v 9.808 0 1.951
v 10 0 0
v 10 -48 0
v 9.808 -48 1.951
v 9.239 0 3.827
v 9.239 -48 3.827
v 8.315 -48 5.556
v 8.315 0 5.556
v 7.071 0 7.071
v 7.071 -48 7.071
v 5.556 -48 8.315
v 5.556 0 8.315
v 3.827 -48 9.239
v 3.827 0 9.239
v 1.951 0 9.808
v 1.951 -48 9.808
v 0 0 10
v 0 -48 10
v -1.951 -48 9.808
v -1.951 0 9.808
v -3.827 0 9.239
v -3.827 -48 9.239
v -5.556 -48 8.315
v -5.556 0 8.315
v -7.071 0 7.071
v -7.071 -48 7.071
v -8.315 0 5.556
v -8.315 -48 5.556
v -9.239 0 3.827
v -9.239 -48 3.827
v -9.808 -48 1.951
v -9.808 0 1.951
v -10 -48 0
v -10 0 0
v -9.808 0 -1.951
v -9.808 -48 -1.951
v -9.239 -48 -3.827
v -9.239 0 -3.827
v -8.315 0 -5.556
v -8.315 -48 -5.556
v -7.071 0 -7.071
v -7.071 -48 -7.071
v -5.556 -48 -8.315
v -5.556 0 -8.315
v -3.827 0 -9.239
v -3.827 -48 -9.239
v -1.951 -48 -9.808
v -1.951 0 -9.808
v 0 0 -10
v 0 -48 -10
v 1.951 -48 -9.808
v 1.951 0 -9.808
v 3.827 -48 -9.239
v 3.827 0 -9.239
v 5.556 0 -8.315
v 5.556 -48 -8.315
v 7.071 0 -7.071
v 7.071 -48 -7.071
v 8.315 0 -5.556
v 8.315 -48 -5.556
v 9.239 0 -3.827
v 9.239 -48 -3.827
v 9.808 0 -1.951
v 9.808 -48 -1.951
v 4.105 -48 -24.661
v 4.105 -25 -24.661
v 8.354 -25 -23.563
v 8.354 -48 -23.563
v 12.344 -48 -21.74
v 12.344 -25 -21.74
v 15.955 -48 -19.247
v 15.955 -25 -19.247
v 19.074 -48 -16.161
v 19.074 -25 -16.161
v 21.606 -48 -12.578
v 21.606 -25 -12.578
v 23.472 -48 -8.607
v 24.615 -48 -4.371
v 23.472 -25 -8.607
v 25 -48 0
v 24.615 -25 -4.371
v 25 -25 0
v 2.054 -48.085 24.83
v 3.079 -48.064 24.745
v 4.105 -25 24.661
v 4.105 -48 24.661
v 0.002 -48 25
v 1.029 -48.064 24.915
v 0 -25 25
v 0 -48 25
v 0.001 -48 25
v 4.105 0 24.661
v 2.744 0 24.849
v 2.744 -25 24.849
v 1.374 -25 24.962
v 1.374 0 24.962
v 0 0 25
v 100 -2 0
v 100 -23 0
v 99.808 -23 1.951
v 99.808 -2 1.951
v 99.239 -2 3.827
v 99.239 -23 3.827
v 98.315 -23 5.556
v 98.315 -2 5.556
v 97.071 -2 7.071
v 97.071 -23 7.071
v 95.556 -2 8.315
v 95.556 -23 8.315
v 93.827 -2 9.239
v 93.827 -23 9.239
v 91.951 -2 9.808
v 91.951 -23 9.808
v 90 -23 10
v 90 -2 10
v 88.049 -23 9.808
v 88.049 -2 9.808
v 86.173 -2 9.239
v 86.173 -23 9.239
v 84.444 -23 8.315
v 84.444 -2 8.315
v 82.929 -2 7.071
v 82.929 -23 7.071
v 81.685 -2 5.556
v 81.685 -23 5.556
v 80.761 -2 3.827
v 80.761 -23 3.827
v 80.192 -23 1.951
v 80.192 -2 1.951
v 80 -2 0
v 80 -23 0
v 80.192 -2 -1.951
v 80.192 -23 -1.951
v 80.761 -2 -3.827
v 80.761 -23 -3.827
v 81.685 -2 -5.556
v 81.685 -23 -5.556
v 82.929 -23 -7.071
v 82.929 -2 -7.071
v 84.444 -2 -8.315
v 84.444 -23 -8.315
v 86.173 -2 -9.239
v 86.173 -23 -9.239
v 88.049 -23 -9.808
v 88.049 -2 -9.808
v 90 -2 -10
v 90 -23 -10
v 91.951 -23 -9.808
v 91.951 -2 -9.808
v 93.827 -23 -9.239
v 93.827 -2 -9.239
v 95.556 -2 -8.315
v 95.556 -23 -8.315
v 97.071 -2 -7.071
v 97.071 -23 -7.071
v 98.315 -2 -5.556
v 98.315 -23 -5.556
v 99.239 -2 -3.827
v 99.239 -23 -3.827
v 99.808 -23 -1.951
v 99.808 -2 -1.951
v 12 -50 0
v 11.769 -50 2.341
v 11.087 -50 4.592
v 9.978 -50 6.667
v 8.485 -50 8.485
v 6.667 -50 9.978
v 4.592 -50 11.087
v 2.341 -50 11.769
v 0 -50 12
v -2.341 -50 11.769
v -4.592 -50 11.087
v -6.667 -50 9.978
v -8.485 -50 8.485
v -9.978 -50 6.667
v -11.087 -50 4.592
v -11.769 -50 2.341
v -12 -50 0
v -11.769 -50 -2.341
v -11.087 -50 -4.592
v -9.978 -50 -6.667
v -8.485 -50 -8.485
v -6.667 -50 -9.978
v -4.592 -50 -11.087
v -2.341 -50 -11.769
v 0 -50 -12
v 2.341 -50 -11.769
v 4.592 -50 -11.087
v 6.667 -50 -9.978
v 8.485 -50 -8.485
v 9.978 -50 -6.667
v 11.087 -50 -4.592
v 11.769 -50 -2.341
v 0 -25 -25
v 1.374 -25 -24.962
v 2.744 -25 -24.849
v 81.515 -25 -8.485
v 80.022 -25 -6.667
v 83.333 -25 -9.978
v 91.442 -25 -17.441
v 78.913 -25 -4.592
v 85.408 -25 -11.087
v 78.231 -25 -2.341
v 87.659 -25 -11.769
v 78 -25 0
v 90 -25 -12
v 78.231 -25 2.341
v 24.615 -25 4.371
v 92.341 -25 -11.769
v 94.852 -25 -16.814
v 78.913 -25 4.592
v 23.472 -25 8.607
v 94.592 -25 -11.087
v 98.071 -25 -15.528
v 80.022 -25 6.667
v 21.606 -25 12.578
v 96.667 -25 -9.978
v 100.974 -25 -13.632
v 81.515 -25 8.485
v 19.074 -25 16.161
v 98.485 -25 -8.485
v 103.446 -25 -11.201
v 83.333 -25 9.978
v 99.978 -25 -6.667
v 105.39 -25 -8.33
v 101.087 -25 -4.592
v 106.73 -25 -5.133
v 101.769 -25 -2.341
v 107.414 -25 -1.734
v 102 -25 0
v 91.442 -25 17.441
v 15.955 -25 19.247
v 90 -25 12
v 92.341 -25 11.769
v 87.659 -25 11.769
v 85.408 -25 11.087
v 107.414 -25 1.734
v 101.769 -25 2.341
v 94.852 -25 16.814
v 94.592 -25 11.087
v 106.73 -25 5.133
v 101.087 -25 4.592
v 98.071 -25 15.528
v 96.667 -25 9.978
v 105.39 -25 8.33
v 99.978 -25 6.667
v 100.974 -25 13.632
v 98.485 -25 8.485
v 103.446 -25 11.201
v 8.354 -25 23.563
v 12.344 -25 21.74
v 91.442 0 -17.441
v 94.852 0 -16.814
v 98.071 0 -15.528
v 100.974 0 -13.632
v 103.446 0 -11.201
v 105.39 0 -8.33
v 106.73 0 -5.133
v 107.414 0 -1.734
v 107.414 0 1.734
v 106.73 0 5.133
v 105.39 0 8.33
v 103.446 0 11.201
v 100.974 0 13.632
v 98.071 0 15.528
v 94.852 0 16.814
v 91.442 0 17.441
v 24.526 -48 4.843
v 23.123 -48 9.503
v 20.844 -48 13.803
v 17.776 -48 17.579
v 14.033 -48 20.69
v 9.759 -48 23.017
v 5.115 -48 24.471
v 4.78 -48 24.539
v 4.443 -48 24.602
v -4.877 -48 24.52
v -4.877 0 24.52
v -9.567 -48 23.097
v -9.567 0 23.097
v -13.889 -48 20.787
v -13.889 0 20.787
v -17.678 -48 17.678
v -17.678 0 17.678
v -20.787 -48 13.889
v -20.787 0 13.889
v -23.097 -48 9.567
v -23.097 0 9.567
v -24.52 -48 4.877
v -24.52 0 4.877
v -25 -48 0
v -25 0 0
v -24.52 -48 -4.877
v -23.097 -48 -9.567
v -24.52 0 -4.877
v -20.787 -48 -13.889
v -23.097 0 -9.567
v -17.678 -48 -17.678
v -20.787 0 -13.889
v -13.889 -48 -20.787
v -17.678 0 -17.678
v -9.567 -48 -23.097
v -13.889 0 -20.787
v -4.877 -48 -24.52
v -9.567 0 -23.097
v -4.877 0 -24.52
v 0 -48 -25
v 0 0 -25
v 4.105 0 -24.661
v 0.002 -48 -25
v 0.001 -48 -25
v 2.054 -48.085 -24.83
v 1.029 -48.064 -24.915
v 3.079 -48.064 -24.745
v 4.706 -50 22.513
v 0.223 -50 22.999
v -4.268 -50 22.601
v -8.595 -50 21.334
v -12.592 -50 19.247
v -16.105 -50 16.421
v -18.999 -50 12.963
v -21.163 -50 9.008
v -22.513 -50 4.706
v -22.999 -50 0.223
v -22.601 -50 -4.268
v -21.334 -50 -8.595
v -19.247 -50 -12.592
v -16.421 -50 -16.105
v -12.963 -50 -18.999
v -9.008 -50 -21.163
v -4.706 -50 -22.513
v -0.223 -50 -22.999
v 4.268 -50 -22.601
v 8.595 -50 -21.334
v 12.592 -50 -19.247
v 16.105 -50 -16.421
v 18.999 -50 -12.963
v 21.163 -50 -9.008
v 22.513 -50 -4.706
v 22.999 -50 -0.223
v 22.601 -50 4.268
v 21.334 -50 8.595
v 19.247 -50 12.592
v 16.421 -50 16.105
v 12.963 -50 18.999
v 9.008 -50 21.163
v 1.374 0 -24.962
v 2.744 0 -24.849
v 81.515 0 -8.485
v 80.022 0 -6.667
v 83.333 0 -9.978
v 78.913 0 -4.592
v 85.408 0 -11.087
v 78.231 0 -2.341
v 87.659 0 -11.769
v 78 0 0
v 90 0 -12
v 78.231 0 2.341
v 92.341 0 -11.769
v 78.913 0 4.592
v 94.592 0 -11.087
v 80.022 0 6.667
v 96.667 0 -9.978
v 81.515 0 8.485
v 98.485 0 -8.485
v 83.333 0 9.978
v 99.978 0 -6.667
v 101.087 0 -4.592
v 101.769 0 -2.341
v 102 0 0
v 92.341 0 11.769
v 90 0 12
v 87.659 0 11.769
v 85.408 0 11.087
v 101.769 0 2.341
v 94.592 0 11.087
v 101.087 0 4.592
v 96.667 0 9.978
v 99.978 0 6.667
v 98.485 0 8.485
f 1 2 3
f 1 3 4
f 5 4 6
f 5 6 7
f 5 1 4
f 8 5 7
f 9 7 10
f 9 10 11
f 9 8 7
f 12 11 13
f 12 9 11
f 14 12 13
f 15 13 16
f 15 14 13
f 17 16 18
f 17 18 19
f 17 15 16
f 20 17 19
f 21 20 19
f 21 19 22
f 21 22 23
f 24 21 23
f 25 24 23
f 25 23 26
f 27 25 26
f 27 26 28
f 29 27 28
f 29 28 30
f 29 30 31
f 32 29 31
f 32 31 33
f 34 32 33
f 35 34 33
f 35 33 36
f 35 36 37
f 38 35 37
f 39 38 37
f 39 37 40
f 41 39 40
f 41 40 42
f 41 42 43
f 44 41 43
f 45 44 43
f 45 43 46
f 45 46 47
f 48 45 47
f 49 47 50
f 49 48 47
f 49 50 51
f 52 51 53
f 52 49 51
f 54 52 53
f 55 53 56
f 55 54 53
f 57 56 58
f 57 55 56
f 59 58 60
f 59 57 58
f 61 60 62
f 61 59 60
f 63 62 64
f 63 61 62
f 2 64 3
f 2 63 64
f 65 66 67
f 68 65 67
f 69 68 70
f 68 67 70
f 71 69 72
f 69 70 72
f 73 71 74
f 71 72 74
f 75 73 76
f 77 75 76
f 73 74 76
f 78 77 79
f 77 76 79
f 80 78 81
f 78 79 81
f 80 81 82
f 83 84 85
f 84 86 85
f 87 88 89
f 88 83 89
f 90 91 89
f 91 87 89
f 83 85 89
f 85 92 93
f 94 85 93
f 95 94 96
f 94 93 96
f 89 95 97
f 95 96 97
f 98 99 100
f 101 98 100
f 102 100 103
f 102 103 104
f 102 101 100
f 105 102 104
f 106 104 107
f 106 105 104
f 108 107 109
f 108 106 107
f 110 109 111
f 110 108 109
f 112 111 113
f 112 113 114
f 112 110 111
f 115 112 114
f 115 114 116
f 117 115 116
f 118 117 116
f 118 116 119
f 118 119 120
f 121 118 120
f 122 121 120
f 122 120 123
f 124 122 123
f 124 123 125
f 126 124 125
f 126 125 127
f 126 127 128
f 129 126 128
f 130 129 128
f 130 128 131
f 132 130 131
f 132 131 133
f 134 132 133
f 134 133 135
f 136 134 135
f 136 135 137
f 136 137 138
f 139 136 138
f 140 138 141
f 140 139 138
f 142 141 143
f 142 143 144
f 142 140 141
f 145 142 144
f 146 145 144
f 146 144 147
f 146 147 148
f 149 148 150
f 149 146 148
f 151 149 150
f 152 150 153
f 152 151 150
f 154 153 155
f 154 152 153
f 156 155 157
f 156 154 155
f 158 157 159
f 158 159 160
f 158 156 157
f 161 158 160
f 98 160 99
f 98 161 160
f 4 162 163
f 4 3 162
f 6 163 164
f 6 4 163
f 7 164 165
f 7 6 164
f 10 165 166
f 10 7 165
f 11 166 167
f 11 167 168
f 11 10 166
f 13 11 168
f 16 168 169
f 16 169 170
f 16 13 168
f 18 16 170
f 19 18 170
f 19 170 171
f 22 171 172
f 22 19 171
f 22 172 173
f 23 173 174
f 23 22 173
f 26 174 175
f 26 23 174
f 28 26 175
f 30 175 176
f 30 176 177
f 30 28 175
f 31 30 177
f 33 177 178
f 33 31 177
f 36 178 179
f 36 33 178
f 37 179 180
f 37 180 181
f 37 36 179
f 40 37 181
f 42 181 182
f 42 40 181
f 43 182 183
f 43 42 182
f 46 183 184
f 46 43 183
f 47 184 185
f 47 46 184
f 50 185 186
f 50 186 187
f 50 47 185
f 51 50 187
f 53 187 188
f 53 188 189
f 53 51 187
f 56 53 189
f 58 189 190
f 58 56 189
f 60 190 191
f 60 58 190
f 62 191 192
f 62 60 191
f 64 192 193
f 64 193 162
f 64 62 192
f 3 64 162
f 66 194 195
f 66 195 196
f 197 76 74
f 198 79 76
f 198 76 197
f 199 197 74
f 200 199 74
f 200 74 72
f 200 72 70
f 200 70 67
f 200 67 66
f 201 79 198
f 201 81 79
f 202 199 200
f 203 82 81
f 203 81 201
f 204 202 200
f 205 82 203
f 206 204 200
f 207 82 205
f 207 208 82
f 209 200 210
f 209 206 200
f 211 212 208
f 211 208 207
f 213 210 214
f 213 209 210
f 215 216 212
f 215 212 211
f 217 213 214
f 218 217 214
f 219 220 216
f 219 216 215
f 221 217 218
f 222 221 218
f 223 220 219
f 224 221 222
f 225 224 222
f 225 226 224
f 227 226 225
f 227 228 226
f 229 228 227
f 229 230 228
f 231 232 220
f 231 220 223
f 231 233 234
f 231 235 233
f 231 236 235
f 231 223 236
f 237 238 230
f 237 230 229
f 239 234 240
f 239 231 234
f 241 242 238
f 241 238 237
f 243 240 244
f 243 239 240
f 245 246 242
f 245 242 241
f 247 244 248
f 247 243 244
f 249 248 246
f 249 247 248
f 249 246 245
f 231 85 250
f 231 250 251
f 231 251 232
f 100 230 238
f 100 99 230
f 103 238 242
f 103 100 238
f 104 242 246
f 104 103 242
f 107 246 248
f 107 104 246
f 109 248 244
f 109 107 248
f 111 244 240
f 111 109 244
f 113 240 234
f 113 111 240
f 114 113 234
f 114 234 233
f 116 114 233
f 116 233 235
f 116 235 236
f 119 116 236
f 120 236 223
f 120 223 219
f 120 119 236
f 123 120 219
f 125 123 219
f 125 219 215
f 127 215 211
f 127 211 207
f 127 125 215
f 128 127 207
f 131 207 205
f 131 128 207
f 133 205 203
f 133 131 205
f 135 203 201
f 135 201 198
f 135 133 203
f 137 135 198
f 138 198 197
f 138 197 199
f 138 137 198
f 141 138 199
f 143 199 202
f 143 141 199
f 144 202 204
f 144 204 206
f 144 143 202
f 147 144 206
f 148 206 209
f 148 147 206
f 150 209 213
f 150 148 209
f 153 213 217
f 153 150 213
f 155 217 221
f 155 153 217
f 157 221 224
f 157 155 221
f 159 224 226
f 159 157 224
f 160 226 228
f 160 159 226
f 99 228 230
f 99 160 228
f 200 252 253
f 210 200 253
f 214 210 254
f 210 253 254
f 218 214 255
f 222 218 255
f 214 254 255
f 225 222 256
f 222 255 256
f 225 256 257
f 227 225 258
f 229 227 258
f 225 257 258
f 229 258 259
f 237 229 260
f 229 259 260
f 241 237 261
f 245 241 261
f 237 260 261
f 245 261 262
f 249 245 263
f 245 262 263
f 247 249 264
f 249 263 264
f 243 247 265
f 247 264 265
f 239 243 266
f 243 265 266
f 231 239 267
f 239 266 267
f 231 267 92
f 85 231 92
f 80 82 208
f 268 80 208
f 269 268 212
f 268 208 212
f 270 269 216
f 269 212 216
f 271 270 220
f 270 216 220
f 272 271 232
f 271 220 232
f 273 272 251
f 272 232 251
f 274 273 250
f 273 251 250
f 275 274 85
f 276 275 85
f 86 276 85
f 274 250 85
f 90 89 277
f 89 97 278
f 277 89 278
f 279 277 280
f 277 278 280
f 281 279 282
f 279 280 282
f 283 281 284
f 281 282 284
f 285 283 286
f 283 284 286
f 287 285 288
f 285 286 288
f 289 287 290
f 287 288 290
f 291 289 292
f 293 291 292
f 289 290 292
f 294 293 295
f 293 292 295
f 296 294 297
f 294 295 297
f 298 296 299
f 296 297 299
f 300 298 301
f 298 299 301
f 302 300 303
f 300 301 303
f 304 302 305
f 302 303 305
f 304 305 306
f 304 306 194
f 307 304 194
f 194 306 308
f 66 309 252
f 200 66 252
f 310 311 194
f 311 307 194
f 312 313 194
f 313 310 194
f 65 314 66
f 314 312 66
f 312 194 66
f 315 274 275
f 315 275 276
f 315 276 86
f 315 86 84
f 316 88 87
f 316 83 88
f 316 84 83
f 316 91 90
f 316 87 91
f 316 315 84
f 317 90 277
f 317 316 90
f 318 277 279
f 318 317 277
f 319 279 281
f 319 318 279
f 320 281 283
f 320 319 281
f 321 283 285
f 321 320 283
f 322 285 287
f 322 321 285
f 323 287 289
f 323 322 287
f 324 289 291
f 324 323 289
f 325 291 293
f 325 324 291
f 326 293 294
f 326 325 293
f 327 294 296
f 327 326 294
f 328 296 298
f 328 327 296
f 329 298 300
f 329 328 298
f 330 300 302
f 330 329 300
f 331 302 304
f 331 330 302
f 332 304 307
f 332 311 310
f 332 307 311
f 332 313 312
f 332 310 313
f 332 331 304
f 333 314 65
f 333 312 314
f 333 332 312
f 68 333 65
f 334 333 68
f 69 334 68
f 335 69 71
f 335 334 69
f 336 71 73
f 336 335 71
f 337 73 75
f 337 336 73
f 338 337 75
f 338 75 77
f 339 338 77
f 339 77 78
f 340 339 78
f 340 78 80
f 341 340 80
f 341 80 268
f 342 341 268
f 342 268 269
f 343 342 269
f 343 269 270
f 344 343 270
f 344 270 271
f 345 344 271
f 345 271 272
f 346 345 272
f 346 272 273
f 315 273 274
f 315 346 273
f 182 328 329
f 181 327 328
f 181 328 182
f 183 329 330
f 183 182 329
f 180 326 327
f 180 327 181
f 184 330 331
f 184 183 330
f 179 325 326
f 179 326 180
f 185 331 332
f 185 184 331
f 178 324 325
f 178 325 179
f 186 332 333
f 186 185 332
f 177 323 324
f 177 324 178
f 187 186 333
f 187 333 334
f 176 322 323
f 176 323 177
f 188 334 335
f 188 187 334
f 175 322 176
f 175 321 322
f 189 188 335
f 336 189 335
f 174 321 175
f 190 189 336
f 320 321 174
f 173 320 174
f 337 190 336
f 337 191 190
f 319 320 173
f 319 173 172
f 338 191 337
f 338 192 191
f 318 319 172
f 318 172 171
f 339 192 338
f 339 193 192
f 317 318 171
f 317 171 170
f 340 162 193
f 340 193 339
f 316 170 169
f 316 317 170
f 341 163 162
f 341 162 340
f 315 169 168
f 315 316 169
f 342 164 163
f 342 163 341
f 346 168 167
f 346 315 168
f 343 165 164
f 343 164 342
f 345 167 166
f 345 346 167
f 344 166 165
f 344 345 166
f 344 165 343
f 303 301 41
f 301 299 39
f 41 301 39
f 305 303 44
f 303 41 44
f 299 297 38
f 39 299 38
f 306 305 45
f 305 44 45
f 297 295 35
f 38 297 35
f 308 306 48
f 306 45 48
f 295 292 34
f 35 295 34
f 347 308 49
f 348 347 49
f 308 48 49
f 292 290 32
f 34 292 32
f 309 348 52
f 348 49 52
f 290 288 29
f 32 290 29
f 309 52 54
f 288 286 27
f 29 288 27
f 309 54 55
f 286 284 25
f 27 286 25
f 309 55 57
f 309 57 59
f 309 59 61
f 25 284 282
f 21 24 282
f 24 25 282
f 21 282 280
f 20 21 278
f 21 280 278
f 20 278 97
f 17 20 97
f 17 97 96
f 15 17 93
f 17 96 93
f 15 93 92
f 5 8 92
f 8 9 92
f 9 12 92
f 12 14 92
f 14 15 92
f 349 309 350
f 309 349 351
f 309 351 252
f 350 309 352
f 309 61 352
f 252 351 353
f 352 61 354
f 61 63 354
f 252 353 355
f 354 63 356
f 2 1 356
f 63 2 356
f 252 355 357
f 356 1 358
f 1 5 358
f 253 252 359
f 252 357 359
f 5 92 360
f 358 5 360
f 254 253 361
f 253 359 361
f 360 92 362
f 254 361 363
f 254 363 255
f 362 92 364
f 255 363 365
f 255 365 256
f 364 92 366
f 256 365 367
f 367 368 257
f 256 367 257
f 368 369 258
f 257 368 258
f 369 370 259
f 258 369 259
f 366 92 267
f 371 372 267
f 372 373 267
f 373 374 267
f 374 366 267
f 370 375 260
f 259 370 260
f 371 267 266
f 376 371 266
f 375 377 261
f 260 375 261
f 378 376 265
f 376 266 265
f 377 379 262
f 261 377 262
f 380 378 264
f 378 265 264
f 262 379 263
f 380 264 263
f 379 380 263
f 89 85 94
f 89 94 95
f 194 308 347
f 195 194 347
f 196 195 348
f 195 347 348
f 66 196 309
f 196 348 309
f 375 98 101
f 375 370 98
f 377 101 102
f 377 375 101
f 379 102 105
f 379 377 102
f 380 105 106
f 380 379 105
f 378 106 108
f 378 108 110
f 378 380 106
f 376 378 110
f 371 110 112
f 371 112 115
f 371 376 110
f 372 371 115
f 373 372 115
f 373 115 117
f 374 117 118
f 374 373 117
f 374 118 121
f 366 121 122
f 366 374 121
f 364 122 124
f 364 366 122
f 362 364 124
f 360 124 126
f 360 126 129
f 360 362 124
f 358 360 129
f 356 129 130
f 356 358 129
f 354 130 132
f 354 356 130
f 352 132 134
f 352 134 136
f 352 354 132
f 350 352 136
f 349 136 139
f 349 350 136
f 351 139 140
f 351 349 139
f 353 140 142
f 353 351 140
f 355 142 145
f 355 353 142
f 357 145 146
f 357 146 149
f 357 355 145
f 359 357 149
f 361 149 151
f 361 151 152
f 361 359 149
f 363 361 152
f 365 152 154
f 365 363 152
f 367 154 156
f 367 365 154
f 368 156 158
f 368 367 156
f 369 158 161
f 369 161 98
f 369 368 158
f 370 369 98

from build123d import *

# Parameters (mm, degrees)
F0_R        = 10
F1_DEPTH    = 25
F2_DEPTH    = 50
F3_T4_ANGLE = 203.6133668192
F3_T6_ANGLE = 179.9906971182


# Not quite as in the source:
# - a fillet or chamfer that OpenCascade refuses, or shapes differently, is made with other operations: its cross-section is extruded or revolved along the edge and cut away or added


with BuildPart() as f1:
    # F0 (on Front) → F1 (new body)
    with BuildSketch(Plane.XZ):
        with BuildLine():
            Line((4.1054428346, 24.6606029758), (0, 25))
            ThreePointArc((0, 25), (-25, 0), (0, -25))
            Line((0, -25), (4.1054428346, -24.6606029758))
            ThreePointArc((4.1054428346, -24.6606029758), (19.0740146648, -16.1611251022), (25, 0))
            ThreePointArc((25, 0), (19.0740146648, 16.1611251022), (4.1054428346, 24.6606029758))
        make_face()
        Circle(F0_R, mode=Mode.SUBTRACT)
        with BuildLine():
            ThreePointArc((4.1054428346, 24.6606029758), (2.0597239626, 24.9150062653), (0, 25))
            Line((0, 25), (4.1054428346, 24.6606029758))
        make_face()
        with BuildLine():
            Line((4.1054428346, -24.6606029758), (0, -25))
            ThreePointArc((0, -25), (2.0597239626, -24.9150062653), (4.1054428346, -24.6606029758))
        make_face()
        with BuildLine():
            Line((91.4418067738, 17.4405043857), (4.1054428346, 24.6606029758))
            ThreePointArc((4.1054428346, 24.6606029758), (19.0740146648, 16.1611251022), (25, 0))
            ThreePointArc((25, 0), (19.0740146648, -16.1611251022), (4.1054428346, -24.6606029758))
            Line((4.1054428346, -24.6606029758), (91.4418067738, -17.4405043857))
            ThreePointArc((91.4418067738, -17.4405043857), (72.5, 0), (91.4418067738, 17.4405043857))
        make_face()
        with BuildLine():
            ThreePointArc((107.5, 0), (102.8740362463, 11.8536572723), (91.4418067738, 17.4405043857))
            ThreePointArc((91.4418067738, 17.4405043857), (72.5, 0), (91.4418067738, -17.4405043857))
            ThreePointArc((91.4418067738, -17.4405043857), (102.8740362463, -11.8536572723), (107.5, 0))
        make_face()
        with Locations((90, 0)):
            Circle(F0_R, mode=Mode.SUBTRACT)
    extrude(amount=F1_DEPTH)

    # F0 (on Front) → F2 (join)
    with BuildSketch(Plane.XZ):
        with BuildLine():
            Line((4.1054428346, 24.6606029758), (0, 25))
            ThreePointArc((0, 25), (-25, 0), (0, -25))
            Line((0, -25), (4.1054428346, -24.6606029758))
            ThreePointArc((4.1054428346, -24.6606029758), (19.0740146648, -16.1611251022), (25, 0))
            ThreePointArc((25, 0), (19.0740146648, 16.1611251022), (4.1054428346, 24.6606029758))
        make_face()
        Circle(F0_R, mode=Mode.SUBTRACT)
    extrude(amount=F2_DEPTH)

    # F3: chamfer of 2 on 5 edges, made by hand

    # F3_s1 → F3_t2 (revolve, cut)
    with BuildSketch(Plane.XY):
        Polygon((12, -50), (10, -48), (10, -50), align=None)
    revolve(axis=Axis((0, -50, 0), (0, -1, 0)), mode=Mode.SUBTRACT)

    # F3_s3 → F3_t4 (revolve, cut)
    with BuildSketch(Plane(origin=(0, 0, 0), x_dir=(0, 1, 0), z_dir=(0.9788435281, 0, -0.2046102329))):
        Polygon((-48, 25), (-50, 23), (-50, 25), align=None)
    revolve(axis=Axis((0, -50, 0), (0, -1, 0)), revolution_arc=F3_T4_ANGLE, mode=Mode.SUBTRACT)

    # F3_s5 → F3_t6 (revolve, cut)
    with BuildSketch(Plane(origin=(0, 0, 0), x_dir=(0, 1, 0), z_dir=(-0.9999999967, 0, 8.1183e-05))):
        Polygon((-48, -25), (-50, -23), (-50, -25), align=None)
    revolve(axis=Axis((0, -50, 0), (0, 1, 0)), revolution_arc=F3_T6_ANGLE, mode=Mode.SUBTRACT)

    # F3_s7 → F3_t8 (revolve, cut)
    with BuildSketch(Plane.XY):
        Polygon((100, -2), (102, 0), (100, 0), align=None)
    revolve(axis=Axis((90, 0, 0), (0, -1, 0)), mode=Mode.SUBTRACT)

    # F3_s9 → F3_t10 (revolve, cut)
    with BuildSketch(Plane.XY):
        Polygon((102, -25), (100, -23), (100, -25), align=None)
    revolve(axis=Axis((90, -25, 0), (0, -1, 0)), mode=Mode.SUBTRACT)


solid = f1.part
